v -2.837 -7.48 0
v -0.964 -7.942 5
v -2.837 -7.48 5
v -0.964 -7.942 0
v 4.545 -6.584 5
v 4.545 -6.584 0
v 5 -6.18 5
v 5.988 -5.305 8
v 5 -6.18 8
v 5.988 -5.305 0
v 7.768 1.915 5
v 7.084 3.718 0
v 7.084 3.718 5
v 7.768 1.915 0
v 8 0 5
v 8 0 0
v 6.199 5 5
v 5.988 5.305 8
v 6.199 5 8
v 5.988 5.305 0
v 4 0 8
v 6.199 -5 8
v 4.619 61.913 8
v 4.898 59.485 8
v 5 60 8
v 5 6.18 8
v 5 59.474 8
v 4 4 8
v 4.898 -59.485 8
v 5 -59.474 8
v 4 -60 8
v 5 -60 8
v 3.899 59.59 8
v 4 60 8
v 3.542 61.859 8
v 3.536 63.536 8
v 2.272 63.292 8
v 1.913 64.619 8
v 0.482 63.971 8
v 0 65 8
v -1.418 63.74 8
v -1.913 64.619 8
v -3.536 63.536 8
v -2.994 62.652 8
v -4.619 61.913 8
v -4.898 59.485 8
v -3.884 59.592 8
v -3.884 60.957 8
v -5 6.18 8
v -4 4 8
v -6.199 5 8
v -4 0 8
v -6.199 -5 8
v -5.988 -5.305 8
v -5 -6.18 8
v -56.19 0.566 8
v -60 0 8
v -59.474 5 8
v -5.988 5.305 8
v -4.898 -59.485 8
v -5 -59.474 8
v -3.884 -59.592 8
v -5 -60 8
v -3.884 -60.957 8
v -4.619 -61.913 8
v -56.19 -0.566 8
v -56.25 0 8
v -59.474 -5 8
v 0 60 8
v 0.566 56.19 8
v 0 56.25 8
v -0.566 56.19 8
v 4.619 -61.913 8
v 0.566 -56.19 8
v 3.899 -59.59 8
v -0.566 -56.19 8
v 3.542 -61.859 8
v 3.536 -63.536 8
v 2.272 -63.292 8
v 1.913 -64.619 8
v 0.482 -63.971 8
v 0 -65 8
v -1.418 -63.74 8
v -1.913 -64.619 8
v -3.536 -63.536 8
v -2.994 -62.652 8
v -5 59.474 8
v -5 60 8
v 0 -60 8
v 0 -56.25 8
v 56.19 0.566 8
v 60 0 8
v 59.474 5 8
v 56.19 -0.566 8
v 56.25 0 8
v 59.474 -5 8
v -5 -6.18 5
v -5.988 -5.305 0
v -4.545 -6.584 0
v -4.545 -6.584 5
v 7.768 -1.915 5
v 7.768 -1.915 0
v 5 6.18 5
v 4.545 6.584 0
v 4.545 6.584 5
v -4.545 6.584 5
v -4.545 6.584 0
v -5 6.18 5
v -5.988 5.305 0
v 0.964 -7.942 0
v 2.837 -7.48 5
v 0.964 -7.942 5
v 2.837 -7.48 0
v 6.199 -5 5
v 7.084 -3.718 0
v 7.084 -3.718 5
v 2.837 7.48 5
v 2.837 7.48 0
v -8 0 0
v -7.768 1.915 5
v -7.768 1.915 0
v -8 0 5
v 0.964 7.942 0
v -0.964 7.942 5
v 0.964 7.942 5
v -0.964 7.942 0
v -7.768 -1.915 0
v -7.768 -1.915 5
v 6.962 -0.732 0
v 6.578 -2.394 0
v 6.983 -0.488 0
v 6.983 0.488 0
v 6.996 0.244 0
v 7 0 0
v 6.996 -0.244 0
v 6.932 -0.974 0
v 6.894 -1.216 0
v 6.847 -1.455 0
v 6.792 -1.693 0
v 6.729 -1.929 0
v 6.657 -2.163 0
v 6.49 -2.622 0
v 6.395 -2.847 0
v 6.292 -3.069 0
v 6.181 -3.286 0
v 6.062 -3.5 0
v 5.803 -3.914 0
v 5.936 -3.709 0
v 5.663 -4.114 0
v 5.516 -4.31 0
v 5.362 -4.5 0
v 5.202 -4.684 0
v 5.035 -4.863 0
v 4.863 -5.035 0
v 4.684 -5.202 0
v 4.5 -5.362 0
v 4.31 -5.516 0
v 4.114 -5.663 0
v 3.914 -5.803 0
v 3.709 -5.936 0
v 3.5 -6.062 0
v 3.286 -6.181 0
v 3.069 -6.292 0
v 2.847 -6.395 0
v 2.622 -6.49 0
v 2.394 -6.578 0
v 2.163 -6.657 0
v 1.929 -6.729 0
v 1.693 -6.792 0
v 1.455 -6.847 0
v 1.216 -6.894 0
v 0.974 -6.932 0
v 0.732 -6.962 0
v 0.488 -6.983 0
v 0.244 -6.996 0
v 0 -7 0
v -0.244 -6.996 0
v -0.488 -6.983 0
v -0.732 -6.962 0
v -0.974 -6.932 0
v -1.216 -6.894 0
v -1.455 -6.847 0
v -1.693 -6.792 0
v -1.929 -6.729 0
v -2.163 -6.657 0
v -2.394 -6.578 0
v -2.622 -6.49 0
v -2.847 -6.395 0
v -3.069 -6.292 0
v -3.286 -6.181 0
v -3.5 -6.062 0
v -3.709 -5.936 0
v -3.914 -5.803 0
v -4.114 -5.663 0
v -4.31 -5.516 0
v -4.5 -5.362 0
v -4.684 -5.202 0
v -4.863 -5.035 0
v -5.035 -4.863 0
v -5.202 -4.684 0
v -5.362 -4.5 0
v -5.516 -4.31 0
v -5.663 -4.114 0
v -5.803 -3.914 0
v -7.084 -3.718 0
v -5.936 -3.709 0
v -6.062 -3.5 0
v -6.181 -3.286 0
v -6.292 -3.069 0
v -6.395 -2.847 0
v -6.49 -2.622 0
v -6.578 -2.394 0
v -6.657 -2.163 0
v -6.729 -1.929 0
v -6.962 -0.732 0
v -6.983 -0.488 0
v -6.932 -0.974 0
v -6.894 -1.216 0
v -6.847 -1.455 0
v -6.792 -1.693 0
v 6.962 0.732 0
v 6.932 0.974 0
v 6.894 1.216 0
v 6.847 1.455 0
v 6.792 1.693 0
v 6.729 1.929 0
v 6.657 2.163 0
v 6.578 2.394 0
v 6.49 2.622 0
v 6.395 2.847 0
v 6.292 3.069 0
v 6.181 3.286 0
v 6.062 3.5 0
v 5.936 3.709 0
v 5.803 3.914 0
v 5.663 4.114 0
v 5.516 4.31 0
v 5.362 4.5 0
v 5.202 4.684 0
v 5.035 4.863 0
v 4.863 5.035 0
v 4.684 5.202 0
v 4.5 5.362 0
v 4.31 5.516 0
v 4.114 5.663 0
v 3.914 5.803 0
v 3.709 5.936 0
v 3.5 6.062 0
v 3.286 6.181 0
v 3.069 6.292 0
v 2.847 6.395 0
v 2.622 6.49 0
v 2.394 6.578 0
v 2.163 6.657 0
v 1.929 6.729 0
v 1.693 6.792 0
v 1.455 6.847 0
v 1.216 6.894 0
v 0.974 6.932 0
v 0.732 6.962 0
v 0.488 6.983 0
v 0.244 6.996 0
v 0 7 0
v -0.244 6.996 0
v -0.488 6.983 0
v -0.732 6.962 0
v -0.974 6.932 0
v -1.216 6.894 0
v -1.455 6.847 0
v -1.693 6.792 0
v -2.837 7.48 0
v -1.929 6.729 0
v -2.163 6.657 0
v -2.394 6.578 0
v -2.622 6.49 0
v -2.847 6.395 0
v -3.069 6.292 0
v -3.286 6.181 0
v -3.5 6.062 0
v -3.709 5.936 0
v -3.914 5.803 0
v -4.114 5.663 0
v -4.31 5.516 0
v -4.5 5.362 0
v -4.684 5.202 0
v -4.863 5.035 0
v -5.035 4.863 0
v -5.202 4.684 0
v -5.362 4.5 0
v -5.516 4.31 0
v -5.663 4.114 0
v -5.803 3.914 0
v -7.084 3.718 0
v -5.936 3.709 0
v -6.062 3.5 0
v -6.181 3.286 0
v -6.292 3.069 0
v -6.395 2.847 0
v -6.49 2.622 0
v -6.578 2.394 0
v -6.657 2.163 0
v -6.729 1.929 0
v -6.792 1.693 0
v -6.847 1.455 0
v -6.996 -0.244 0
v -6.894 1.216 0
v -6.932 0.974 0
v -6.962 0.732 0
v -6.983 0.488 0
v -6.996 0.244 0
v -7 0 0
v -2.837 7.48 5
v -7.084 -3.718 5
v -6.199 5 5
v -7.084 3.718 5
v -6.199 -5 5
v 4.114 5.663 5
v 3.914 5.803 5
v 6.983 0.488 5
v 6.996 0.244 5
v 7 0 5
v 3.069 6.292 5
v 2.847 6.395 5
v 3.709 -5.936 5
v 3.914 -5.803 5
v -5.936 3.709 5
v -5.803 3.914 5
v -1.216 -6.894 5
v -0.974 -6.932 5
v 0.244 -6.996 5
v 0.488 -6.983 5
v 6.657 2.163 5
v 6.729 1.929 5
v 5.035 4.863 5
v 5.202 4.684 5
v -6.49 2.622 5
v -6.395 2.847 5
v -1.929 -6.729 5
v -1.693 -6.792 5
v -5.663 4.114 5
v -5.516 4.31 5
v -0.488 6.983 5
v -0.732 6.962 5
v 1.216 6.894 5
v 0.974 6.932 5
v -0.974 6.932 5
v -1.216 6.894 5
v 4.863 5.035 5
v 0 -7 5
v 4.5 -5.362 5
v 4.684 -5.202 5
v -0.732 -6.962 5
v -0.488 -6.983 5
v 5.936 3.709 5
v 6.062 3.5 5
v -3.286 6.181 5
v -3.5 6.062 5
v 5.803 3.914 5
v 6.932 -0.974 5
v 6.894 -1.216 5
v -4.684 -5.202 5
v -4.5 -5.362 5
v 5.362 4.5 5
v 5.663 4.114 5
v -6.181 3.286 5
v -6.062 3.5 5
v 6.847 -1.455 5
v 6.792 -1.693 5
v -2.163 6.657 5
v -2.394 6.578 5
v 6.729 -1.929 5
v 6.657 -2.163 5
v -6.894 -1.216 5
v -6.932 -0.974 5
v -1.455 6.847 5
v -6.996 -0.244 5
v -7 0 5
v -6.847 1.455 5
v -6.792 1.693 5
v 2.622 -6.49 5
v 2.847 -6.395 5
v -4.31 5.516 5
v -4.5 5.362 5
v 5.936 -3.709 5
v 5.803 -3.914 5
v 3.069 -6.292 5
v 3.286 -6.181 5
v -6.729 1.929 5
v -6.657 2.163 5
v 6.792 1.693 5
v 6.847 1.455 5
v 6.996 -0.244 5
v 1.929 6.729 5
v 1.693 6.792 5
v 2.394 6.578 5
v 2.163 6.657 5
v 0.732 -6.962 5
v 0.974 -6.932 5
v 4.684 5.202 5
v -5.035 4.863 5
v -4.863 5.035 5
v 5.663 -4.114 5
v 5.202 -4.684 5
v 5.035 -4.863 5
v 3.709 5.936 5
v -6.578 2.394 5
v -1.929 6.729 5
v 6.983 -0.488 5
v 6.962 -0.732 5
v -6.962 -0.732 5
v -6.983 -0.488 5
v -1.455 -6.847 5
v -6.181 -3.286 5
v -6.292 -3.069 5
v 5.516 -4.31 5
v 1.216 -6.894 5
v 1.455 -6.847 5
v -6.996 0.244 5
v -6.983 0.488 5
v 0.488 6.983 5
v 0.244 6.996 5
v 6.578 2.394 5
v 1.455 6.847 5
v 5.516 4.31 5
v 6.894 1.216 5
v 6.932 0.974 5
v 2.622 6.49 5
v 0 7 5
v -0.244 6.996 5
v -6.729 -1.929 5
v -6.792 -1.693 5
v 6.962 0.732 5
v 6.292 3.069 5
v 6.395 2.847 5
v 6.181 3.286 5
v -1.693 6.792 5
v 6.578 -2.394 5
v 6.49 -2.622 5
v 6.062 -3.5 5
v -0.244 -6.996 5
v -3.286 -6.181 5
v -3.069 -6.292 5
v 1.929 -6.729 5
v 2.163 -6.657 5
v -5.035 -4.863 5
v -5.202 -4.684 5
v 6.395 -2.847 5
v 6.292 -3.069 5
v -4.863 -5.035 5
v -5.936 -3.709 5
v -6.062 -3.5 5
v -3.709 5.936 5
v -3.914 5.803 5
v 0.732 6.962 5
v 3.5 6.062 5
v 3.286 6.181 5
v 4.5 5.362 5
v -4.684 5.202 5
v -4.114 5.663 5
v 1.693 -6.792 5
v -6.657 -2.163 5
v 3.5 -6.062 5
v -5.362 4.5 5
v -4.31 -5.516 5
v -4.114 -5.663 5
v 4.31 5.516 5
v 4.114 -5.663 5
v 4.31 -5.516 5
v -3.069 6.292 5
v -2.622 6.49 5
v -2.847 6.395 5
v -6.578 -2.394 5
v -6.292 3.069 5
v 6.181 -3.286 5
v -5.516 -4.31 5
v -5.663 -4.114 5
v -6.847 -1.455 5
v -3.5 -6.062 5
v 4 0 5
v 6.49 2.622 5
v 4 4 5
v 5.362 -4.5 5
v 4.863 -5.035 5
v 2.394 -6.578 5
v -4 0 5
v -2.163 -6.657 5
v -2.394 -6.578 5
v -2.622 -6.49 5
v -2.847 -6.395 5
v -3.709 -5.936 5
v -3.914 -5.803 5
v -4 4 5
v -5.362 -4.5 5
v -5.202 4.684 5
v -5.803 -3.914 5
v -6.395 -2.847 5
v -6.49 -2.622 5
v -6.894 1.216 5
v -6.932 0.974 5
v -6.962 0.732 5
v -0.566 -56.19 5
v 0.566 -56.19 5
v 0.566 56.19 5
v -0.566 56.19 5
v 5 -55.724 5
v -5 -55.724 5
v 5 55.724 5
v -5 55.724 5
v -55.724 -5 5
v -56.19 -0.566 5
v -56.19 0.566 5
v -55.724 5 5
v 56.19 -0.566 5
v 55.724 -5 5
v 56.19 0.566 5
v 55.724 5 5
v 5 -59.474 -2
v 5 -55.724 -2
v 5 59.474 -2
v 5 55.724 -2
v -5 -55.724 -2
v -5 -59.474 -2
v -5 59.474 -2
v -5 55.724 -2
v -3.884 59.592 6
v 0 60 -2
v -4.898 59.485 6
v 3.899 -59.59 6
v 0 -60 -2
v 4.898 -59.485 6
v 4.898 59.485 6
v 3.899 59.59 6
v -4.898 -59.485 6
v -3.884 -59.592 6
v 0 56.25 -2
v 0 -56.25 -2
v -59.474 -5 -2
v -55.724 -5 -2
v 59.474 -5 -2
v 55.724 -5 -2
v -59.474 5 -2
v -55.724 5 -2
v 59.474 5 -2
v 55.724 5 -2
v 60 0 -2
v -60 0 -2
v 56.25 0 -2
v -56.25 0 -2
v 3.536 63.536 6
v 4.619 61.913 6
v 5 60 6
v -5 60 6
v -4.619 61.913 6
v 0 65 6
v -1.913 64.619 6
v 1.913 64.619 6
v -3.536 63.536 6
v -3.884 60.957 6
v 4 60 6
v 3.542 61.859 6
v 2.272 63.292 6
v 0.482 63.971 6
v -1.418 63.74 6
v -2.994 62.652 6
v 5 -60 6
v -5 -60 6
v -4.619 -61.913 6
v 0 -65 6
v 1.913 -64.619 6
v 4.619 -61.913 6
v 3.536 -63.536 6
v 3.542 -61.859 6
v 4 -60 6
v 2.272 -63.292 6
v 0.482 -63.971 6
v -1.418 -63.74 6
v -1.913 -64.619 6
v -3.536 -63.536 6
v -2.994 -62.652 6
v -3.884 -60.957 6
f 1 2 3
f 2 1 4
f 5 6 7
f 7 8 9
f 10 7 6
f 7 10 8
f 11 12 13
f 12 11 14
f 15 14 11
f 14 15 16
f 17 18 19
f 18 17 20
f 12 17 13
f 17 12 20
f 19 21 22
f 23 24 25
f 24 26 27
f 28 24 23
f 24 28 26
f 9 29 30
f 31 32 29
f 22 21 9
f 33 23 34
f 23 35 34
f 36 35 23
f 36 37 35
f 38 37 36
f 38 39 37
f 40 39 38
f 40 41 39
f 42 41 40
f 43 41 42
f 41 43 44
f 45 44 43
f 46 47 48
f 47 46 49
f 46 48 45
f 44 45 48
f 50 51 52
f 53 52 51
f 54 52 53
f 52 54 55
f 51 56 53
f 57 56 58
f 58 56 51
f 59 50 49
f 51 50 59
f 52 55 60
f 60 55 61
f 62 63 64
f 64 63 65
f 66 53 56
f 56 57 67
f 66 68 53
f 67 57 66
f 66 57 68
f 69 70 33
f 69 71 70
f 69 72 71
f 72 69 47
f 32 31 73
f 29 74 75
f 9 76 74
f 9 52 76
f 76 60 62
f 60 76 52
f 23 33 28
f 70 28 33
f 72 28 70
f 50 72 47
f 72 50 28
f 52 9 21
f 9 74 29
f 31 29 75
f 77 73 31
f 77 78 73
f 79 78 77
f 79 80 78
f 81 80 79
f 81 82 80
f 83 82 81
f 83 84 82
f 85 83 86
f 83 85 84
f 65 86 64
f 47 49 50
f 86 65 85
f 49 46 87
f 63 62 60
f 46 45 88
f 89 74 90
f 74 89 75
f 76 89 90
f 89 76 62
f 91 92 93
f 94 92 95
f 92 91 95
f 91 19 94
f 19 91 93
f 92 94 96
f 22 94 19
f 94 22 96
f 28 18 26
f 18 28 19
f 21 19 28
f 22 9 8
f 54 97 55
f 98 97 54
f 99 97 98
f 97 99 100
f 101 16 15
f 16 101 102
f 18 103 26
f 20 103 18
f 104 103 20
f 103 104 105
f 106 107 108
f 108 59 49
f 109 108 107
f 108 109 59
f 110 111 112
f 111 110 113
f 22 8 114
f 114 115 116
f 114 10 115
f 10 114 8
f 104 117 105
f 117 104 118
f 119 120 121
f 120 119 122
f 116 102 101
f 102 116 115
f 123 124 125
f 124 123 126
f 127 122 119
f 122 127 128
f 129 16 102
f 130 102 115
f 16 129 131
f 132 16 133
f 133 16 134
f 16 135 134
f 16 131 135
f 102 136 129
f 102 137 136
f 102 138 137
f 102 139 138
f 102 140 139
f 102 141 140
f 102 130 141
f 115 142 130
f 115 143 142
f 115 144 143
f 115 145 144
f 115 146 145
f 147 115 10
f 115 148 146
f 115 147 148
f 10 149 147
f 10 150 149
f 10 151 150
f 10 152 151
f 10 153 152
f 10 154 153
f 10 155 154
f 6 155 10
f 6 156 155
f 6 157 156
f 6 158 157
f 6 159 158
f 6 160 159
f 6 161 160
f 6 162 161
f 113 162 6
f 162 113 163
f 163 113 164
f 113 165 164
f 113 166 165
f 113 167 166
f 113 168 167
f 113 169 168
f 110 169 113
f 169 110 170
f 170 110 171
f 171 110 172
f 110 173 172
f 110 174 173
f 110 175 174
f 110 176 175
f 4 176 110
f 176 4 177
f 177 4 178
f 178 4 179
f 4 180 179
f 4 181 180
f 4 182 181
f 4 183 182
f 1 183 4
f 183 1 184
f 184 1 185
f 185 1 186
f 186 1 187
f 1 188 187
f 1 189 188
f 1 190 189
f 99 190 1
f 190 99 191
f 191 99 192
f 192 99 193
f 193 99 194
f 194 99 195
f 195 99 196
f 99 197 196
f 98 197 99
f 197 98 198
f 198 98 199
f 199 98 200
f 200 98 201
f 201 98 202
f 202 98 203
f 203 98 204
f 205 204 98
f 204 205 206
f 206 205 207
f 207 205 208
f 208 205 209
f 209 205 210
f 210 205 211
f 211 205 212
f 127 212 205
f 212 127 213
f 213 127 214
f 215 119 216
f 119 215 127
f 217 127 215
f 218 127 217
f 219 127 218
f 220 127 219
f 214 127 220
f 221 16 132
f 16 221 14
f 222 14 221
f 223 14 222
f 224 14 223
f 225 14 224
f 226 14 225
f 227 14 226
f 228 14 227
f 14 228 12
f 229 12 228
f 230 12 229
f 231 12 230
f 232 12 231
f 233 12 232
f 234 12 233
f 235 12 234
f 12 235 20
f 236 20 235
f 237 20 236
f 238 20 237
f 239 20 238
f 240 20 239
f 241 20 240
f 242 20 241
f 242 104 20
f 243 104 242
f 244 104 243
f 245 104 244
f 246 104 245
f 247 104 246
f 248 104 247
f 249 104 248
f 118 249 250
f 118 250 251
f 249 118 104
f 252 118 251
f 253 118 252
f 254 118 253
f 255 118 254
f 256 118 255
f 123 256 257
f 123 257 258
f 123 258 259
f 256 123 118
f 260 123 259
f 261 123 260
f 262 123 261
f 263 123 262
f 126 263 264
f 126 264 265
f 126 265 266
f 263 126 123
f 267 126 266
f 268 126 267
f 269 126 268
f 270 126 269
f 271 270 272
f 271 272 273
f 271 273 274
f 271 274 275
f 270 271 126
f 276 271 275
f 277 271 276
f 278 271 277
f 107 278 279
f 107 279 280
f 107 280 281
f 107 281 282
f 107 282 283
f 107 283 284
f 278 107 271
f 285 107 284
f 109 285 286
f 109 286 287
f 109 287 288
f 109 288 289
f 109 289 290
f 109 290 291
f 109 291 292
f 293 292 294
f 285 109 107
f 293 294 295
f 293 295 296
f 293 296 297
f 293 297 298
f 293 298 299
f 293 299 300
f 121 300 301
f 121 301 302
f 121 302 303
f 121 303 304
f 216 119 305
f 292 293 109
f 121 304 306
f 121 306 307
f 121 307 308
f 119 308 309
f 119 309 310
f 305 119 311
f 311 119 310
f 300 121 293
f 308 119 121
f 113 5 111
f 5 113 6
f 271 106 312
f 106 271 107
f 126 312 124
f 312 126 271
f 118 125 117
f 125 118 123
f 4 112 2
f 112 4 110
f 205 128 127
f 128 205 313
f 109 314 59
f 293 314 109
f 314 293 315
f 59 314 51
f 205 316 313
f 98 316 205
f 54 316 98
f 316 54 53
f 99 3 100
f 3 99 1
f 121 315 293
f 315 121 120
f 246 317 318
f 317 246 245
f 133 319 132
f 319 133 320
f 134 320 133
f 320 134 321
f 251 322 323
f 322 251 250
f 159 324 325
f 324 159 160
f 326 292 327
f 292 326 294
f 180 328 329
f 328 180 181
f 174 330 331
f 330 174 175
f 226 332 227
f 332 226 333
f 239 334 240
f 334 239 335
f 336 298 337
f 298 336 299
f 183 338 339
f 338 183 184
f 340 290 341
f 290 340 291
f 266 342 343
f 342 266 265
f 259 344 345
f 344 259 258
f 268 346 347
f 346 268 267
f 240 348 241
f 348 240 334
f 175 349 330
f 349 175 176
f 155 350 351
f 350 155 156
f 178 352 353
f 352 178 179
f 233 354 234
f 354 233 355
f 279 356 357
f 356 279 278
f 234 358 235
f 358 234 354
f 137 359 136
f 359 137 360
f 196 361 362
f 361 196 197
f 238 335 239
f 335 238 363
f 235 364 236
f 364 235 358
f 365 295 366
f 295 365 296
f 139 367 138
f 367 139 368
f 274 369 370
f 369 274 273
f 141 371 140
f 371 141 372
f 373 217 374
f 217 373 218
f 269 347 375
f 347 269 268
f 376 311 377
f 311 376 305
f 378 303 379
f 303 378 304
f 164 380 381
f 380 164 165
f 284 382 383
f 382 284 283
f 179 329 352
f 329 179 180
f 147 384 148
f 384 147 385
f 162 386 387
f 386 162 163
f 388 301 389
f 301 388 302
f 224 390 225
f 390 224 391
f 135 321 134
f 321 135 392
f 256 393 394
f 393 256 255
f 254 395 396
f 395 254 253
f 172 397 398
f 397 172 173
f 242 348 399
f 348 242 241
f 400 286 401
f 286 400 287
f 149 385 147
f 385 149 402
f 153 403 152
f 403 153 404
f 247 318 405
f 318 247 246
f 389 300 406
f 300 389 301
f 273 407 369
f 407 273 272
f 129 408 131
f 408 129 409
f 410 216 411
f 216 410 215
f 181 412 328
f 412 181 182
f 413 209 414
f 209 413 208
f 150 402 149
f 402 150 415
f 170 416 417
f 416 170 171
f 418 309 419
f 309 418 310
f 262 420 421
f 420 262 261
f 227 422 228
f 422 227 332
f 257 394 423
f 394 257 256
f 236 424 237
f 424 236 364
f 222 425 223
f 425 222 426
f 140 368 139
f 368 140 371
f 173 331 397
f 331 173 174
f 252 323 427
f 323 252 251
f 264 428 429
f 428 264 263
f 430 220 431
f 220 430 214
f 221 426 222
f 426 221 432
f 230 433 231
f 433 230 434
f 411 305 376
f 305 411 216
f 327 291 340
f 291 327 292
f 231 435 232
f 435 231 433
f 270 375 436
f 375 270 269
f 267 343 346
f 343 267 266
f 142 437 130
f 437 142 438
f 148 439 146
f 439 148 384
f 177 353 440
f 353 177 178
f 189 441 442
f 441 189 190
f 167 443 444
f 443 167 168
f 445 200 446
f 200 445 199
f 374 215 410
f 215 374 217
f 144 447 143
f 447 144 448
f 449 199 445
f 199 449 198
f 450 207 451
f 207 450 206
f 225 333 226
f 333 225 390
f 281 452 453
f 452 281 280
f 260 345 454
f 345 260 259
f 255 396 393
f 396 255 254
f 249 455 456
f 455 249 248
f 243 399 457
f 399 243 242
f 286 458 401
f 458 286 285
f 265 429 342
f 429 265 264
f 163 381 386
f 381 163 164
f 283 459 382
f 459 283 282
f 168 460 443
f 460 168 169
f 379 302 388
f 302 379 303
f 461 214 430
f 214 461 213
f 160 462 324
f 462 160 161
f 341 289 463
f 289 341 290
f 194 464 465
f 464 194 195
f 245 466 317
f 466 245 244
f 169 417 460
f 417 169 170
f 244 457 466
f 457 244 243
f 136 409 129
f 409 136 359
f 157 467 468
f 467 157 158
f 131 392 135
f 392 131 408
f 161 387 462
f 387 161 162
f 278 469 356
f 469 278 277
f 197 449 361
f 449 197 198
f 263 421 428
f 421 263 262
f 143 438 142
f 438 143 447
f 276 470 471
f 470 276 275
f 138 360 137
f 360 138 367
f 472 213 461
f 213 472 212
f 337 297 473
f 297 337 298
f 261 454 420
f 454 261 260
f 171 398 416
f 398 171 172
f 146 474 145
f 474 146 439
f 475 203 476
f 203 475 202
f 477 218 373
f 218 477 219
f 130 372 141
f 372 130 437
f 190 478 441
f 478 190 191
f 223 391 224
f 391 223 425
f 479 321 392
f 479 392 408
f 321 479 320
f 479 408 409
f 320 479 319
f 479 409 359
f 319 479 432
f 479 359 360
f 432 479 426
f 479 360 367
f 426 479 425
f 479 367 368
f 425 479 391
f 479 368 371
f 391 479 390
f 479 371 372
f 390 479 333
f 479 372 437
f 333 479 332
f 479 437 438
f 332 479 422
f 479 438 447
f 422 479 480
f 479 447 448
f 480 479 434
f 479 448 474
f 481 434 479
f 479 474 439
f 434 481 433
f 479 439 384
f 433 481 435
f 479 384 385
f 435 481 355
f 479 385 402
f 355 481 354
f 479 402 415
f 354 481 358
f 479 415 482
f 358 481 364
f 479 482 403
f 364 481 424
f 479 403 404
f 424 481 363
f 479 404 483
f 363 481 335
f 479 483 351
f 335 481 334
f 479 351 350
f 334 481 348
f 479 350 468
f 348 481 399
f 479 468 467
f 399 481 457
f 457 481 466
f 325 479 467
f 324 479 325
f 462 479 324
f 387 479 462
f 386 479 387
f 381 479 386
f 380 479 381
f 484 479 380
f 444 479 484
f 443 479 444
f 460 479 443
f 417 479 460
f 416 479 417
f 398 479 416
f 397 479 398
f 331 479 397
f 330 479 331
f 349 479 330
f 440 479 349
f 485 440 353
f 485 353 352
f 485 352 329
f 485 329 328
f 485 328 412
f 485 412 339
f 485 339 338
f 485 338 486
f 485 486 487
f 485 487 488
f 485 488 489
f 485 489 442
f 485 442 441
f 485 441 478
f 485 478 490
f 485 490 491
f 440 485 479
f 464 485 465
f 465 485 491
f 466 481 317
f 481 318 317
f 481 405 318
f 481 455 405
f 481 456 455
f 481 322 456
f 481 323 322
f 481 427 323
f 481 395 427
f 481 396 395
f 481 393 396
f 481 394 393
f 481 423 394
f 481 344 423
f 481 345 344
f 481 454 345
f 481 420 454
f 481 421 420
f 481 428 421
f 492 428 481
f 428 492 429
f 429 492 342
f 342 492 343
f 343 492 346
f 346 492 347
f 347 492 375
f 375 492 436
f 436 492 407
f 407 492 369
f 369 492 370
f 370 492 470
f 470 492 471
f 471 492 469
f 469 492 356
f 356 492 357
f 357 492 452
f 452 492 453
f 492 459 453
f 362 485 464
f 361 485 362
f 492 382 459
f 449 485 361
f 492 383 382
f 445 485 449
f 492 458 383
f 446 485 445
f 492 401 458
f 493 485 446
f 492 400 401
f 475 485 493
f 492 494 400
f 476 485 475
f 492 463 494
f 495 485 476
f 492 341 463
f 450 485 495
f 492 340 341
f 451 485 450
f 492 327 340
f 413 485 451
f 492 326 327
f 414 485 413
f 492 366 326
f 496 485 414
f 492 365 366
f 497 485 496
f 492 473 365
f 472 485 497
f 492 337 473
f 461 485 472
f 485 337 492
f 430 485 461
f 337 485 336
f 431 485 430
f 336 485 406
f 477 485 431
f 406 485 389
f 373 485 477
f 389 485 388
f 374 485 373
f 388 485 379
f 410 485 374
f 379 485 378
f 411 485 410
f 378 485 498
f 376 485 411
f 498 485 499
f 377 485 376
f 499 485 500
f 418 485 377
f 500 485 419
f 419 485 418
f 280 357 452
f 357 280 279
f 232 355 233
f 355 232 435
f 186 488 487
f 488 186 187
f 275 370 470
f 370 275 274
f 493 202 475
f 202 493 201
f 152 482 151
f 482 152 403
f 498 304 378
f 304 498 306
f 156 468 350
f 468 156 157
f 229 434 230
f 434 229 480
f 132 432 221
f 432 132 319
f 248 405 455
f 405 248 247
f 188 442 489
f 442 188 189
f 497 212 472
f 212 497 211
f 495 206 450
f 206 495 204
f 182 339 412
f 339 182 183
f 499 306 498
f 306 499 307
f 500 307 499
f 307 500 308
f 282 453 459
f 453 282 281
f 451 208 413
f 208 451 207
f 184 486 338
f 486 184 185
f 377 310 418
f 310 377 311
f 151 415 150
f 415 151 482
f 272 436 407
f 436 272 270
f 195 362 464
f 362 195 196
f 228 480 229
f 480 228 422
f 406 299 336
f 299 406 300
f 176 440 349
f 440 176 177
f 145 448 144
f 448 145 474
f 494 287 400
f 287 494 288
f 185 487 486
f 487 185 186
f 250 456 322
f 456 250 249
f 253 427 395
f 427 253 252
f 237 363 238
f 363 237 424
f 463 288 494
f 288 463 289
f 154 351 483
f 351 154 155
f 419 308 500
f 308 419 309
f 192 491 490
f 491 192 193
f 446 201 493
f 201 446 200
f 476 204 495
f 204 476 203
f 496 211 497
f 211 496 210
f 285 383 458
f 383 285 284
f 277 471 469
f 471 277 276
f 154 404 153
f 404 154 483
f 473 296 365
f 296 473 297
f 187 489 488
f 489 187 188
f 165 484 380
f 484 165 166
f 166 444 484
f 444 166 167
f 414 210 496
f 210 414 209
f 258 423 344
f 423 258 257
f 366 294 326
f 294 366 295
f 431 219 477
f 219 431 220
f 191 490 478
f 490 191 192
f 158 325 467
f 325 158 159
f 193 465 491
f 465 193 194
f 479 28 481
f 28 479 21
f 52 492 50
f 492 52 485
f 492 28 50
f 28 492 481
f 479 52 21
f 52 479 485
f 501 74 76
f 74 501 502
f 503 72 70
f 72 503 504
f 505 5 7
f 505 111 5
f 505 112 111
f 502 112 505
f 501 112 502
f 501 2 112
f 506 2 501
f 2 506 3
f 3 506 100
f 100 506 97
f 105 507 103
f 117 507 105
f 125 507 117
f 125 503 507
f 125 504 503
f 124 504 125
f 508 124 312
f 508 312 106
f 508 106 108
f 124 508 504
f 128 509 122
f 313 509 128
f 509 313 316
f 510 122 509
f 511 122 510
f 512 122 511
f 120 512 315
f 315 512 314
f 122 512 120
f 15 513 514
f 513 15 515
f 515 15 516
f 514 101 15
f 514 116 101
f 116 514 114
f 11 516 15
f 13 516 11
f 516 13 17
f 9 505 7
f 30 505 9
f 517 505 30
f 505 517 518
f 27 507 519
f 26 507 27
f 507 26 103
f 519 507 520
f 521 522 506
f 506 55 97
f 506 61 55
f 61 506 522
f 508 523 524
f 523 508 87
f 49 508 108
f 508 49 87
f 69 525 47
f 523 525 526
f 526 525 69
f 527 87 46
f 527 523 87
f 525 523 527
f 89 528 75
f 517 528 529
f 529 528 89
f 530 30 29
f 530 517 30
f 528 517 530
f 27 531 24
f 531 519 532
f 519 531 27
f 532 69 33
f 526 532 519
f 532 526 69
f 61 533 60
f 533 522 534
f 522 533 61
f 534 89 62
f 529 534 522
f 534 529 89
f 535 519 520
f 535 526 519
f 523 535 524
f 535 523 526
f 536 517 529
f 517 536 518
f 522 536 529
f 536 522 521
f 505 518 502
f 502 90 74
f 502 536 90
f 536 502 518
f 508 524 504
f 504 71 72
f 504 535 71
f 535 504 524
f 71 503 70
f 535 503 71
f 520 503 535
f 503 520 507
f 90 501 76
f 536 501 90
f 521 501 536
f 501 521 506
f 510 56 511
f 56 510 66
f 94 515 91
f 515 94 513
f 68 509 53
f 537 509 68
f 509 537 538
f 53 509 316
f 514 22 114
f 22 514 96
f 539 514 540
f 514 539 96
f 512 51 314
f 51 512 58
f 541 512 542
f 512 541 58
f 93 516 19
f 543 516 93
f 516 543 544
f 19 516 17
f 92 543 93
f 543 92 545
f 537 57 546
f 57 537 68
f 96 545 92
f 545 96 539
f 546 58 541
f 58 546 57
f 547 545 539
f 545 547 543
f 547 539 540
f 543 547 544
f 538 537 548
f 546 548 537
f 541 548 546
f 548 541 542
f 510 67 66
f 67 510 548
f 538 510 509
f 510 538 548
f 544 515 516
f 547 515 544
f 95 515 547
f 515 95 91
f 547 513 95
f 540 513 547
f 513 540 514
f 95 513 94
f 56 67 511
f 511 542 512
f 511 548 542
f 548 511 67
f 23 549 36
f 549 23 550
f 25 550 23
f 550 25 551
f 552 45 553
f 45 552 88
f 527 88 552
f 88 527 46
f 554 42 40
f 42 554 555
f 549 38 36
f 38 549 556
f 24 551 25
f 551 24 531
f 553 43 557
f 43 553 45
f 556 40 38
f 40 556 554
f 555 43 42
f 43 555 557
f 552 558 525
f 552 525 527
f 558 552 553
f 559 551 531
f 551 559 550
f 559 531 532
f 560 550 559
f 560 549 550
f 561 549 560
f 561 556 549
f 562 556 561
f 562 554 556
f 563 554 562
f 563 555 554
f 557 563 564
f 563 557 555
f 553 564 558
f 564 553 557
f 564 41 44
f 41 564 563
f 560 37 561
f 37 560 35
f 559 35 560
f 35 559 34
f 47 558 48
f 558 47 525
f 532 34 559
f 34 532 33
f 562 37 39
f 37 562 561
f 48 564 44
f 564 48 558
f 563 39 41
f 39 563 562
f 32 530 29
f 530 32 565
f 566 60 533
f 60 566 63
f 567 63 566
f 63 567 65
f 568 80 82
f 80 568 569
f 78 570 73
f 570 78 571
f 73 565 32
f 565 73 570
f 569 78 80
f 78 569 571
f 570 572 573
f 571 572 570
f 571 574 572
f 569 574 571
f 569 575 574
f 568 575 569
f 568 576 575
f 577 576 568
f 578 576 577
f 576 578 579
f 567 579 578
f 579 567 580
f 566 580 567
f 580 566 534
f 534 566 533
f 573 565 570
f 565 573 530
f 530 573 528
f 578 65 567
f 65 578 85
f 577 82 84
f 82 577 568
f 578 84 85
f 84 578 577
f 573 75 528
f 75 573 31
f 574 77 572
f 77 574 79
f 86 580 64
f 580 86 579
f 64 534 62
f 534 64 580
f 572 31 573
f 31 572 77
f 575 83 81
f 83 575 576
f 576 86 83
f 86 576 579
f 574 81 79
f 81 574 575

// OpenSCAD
// d = 9.5mm, h = 0.45cm --> microphone
// d = 11cm --> tube
// assuming 1cm = 10
expa = 1;


// microphone holder
difference () {
    cylinder(h = 8, d = (14 + 2*expa), center = false);
    translate ([0,0,-1])
        cylinder(h = 6, d = (12 + 2*expa), center = false, $fn = 180); //h = 2*height
    
    translate ([-4,0,1])
    {
        cube([8,4,15], center = false);
    }
}

difference () {
    union () {
        translate ([0,0,8]) {
            rotate ([180,0,90]) {
            // bridge 1
                union () {
                    rotate ([0,0,90]) {
                        difference () {  // bridge
                            translate ([0,0,0])
                                cylinder (h = 3,d = (111 + 2*expa), center = false);
                            translate ([5,-57,-2])
                                cube (115, center = false);
                            translate ([-120,-57,-2])
                                cube (115, center = false);
                        }
                    }
                }

            // connecter
                difference () {
                    cylinder (h = 10,d = 120, center = false);
                    
                    translate ([-65,5,-10])
                        cube ([130,110,100], center = false);
                    translate ([-65,-115,-10])
                        cube ([130,110,100], center = false);
                    
                    translate ([0,0,-10])
                        cylinder (h = 100, d = (110.5 + 2*expa), center = false);
                }
            }
        }
        translate ([0,0,8]) {
            rotate ([180,0,0]) {
            // bridge 2
                union () {
                    rotate ([0,0,90]) {
                        difference () {
                            translate ([0,0,0])
                                cylinder (h = 3,d = (111 + 2*expa), center = false);
                            translate ([5,-57,-2])
                                cube (115, center = false);
                            translate ([-120,-57,-2])
                                cube (115, center = false);
                        }
                    }
                }

            // connecter
                difference () {
                    cylinder (h = 10,d = 120, center = false);
                    
                    translate ([-65,5,-10])
                        cube ([130,110,100], center = false);
                    translate ([-65,-115,-10])
                        cube ([130,110,100], center = false);
                    
                    translate ([0,0,-10])
                        cylinder (h = 100, d = (110.5 + 2*expa), center = false);
                }
            }
        }
    }
    translate([0,0,-20])
          cylinder(h = 111, d = (13 + 2*expa), center = false);  // holder
}

// hoops
translate ([0,60,6]) {
    rotate ([0,0,0]) {
        difference() {
            cylinder(h = 2, r = 5, center = false);
            translate ([0,0,-1])
                cylinder(h = 4, r = 4, center = false);
        }
    }
}
translate ([0,-60,6]) {
    rotate ([0,0,0]) {
        difference() {
            cylinder(h = 2, r = 5, center = false);
            translate ([0,0,-1])
                cylinder(h = 4, r = 4, center = false);
        }
    }
}
